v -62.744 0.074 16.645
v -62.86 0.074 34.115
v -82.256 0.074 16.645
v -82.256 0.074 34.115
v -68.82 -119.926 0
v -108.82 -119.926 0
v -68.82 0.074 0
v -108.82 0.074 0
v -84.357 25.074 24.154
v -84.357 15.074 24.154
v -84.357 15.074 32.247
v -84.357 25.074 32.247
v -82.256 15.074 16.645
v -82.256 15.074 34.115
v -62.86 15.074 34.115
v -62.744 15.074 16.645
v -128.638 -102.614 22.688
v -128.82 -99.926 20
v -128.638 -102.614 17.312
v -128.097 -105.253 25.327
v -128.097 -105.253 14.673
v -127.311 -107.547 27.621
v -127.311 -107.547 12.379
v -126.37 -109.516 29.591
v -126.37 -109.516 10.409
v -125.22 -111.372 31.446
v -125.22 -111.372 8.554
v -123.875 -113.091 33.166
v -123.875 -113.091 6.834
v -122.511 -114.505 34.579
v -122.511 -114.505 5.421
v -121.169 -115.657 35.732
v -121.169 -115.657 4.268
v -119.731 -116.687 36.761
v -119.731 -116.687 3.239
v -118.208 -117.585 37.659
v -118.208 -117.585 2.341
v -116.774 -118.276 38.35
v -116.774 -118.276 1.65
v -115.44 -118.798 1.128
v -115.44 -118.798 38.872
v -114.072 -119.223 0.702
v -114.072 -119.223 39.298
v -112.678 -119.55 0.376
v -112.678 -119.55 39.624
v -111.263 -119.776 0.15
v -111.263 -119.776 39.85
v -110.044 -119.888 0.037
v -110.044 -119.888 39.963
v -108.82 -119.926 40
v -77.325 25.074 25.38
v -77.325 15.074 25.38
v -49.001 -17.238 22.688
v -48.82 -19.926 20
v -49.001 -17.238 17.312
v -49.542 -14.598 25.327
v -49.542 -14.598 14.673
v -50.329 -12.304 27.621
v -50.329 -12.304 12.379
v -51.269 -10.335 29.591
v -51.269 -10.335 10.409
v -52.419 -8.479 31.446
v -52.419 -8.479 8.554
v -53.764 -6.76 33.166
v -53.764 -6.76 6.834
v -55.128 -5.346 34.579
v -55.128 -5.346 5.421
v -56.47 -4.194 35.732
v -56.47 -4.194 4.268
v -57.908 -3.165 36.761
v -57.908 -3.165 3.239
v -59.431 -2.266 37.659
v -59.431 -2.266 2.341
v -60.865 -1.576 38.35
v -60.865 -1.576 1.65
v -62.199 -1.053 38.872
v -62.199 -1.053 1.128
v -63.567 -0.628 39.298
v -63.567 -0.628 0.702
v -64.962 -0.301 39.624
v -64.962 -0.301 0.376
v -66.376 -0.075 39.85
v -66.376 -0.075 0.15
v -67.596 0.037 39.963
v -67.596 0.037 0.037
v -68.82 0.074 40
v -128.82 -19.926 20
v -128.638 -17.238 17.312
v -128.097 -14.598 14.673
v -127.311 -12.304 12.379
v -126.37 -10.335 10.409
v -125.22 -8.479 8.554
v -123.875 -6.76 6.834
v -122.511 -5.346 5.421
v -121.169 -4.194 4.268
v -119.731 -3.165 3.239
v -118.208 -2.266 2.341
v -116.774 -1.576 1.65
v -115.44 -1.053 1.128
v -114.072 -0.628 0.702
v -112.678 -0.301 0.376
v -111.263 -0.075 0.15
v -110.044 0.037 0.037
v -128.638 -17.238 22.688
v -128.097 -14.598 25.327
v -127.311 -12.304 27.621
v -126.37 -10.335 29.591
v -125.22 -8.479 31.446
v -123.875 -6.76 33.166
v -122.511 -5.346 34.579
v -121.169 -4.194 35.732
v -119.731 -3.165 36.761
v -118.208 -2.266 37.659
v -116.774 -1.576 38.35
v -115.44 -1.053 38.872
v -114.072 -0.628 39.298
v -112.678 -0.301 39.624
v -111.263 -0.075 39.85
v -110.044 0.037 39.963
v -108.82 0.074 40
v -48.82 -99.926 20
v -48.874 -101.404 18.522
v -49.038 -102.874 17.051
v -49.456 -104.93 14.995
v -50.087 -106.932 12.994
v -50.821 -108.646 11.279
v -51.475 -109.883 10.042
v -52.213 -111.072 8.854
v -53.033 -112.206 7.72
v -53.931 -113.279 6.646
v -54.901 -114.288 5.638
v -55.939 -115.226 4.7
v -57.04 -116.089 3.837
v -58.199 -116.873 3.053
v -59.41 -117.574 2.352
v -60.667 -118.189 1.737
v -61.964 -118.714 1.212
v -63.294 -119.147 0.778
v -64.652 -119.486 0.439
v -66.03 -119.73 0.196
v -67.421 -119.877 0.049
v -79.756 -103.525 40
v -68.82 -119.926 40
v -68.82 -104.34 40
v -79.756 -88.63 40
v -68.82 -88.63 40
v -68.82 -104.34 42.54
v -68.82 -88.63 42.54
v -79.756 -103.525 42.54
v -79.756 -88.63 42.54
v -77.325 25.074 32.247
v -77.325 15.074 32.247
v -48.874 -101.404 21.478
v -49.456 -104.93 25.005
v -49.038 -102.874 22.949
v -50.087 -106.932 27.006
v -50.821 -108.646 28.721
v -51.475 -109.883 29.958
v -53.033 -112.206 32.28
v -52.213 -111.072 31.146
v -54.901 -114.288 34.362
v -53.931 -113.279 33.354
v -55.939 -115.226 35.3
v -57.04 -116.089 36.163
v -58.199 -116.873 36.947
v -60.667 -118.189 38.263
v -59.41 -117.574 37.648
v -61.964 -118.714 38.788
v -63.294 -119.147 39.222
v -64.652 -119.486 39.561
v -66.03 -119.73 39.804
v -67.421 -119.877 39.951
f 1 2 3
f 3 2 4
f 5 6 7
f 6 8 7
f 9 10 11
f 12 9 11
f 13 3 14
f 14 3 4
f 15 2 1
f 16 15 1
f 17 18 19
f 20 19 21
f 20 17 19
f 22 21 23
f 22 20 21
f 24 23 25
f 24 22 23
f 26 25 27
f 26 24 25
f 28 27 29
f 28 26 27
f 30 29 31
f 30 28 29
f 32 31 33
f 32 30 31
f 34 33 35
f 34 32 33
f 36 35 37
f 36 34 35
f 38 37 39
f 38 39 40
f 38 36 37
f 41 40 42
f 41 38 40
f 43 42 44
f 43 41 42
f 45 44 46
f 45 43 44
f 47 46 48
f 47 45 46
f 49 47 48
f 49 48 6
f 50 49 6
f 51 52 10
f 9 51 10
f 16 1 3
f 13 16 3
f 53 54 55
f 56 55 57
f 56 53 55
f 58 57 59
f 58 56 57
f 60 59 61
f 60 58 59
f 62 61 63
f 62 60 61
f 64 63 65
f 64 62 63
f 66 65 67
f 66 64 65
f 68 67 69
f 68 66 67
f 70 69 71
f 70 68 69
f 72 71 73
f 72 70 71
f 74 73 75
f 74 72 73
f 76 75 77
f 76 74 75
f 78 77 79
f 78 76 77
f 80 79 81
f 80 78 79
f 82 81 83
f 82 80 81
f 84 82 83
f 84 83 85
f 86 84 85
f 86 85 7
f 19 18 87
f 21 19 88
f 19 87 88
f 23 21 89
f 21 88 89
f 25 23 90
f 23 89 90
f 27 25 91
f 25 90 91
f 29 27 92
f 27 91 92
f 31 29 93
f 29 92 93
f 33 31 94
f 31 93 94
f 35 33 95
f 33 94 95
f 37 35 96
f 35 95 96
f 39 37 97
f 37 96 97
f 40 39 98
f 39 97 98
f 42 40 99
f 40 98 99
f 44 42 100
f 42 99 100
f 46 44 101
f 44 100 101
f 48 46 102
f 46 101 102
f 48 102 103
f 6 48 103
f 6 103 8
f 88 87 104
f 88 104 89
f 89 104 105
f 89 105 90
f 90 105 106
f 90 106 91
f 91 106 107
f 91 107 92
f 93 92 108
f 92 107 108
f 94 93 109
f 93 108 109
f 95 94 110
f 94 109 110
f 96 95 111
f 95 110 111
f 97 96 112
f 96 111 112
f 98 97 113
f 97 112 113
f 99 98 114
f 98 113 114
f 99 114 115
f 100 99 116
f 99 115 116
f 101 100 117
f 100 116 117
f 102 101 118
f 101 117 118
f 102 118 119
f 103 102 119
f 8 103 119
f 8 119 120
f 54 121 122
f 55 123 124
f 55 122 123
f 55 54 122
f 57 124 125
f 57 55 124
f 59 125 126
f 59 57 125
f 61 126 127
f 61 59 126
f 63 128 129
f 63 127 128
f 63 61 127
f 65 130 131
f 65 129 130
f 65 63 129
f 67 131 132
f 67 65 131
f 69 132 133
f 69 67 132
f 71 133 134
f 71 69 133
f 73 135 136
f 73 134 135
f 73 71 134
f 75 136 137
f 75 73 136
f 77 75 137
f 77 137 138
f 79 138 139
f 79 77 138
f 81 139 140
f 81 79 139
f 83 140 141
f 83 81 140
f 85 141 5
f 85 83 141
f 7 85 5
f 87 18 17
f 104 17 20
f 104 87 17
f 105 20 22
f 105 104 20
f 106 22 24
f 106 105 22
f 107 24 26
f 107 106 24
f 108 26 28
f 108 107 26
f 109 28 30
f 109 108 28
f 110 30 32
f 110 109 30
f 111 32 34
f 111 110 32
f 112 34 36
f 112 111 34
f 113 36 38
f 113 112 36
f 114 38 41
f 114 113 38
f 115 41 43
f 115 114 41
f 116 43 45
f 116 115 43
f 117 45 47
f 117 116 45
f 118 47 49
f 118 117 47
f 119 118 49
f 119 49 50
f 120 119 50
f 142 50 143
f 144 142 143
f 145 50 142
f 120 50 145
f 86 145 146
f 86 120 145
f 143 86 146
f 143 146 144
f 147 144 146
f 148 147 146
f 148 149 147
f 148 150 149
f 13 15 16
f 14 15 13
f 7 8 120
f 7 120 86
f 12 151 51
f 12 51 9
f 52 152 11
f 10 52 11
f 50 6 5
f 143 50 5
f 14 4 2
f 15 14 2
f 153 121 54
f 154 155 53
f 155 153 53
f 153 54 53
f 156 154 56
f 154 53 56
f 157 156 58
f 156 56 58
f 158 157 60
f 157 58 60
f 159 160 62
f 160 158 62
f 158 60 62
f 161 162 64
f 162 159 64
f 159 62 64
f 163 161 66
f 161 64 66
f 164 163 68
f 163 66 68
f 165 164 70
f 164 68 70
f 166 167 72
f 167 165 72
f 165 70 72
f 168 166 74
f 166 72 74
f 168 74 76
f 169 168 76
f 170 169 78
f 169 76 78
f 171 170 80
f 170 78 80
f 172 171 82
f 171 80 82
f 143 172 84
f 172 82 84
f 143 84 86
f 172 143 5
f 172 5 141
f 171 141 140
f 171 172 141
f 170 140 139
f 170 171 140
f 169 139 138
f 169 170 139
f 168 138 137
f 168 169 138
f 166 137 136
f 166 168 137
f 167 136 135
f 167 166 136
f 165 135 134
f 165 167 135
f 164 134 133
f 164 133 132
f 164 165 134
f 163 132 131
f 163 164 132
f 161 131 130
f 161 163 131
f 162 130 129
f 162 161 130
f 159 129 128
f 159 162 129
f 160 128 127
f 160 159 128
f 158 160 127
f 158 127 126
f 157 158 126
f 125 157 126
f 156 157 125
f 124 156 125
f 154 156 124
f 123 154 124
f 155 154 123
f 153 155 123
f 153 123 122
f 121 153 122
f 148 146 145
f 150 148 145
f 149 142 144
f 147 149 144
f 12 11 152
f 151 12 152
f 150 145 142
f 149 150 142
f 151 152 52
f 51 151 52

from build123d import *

# Parameters (mm, degrees)
F0_W     = 80
F0_H     = 120
F1_DEPTH = 40
F2_R     = 19.99999
F4_DEPTH = 2.54
F6_DEPTH = 15
F8_DEPTH = 10


# Not quite as in the source:
# - a fillet or chamfer is up to 0.001 mm smaller than in the source, because OpenCascade refuses the exact size


with BuildPart() as f1:
    # F0 (on Top) → F1 (new body)
    with BuildSketch(Plane.XY):
        with Locations((-88.8195456503, -59.9255193707)):
            Rectangle(F0_W, F0_H)
    extrude(amount=F1_DEPTH)

    # F2 (radius 20 in the source; OpenCascade refuses exactly that, so slightly less here)
    f2_edges = [f1.edges().sort_by_distance(p)[0] for p in [
        (-48.819546, -119.925519, 20),
        (-48.819546, 0.074481, 20),
        (-48.819546, -59.925519, 0),
        (-48.819546, -59.925519, 40),
        (-128.819546, 0.074481, 20),
        (-128.819546, -119.925519, 20),
        (-128.819546, -59.925519, 0),
        (-128.819546, -59.925519, 40),
    ]]
    fillet(f2_edges, radius=F2_R)

    # F3 (on face) → F4 (join)
    with BuildSketch(Plane.XY.offset(40)):
        Polygon((-79.7564014792, -103.5247588724), (-68.8195456503, -104.3402352648), (-68.8195456503, -88.6302217841), (-79.7564014792, -88.6302217841), align=None)
    extrude(amount=F4_DEPTH)


with BuildPart() as f6:
    # F5 (on face) → F6 (new body)
    with BuildSketch(Plane(origin=(0, 0.0744806293, 0), x_dir=(-1, 0, 0), z_dir=(0, 1, 0))):
        Polygon((82.2559818625, 34.1151989996), (62.8604739904, 34.1151989996), (62.7438053489, 16.6449602693), (82.2559818625, 16.6449602693), align=None)
    extrude(amount=F6_DEPTH)


with BuildPart() as f8:
    # F7 (on face) → F8 (new body)
    with BuildSketch(Plane(origin=(0, 15.0744806293, 0), x_dir=(-1, 0, 0), z_dir=(0, 1, 0))):
        Polygon((77.3247284815, 32.2467796504), (77.3247284815, 25.3800796345), (84.357063286, 24.1537168622), (84.357063286, 32.2467796504), align=None)
    extrude(amount=F8_DEPTH)


solid = Compound([f1.part, f6.part, f8.part])
